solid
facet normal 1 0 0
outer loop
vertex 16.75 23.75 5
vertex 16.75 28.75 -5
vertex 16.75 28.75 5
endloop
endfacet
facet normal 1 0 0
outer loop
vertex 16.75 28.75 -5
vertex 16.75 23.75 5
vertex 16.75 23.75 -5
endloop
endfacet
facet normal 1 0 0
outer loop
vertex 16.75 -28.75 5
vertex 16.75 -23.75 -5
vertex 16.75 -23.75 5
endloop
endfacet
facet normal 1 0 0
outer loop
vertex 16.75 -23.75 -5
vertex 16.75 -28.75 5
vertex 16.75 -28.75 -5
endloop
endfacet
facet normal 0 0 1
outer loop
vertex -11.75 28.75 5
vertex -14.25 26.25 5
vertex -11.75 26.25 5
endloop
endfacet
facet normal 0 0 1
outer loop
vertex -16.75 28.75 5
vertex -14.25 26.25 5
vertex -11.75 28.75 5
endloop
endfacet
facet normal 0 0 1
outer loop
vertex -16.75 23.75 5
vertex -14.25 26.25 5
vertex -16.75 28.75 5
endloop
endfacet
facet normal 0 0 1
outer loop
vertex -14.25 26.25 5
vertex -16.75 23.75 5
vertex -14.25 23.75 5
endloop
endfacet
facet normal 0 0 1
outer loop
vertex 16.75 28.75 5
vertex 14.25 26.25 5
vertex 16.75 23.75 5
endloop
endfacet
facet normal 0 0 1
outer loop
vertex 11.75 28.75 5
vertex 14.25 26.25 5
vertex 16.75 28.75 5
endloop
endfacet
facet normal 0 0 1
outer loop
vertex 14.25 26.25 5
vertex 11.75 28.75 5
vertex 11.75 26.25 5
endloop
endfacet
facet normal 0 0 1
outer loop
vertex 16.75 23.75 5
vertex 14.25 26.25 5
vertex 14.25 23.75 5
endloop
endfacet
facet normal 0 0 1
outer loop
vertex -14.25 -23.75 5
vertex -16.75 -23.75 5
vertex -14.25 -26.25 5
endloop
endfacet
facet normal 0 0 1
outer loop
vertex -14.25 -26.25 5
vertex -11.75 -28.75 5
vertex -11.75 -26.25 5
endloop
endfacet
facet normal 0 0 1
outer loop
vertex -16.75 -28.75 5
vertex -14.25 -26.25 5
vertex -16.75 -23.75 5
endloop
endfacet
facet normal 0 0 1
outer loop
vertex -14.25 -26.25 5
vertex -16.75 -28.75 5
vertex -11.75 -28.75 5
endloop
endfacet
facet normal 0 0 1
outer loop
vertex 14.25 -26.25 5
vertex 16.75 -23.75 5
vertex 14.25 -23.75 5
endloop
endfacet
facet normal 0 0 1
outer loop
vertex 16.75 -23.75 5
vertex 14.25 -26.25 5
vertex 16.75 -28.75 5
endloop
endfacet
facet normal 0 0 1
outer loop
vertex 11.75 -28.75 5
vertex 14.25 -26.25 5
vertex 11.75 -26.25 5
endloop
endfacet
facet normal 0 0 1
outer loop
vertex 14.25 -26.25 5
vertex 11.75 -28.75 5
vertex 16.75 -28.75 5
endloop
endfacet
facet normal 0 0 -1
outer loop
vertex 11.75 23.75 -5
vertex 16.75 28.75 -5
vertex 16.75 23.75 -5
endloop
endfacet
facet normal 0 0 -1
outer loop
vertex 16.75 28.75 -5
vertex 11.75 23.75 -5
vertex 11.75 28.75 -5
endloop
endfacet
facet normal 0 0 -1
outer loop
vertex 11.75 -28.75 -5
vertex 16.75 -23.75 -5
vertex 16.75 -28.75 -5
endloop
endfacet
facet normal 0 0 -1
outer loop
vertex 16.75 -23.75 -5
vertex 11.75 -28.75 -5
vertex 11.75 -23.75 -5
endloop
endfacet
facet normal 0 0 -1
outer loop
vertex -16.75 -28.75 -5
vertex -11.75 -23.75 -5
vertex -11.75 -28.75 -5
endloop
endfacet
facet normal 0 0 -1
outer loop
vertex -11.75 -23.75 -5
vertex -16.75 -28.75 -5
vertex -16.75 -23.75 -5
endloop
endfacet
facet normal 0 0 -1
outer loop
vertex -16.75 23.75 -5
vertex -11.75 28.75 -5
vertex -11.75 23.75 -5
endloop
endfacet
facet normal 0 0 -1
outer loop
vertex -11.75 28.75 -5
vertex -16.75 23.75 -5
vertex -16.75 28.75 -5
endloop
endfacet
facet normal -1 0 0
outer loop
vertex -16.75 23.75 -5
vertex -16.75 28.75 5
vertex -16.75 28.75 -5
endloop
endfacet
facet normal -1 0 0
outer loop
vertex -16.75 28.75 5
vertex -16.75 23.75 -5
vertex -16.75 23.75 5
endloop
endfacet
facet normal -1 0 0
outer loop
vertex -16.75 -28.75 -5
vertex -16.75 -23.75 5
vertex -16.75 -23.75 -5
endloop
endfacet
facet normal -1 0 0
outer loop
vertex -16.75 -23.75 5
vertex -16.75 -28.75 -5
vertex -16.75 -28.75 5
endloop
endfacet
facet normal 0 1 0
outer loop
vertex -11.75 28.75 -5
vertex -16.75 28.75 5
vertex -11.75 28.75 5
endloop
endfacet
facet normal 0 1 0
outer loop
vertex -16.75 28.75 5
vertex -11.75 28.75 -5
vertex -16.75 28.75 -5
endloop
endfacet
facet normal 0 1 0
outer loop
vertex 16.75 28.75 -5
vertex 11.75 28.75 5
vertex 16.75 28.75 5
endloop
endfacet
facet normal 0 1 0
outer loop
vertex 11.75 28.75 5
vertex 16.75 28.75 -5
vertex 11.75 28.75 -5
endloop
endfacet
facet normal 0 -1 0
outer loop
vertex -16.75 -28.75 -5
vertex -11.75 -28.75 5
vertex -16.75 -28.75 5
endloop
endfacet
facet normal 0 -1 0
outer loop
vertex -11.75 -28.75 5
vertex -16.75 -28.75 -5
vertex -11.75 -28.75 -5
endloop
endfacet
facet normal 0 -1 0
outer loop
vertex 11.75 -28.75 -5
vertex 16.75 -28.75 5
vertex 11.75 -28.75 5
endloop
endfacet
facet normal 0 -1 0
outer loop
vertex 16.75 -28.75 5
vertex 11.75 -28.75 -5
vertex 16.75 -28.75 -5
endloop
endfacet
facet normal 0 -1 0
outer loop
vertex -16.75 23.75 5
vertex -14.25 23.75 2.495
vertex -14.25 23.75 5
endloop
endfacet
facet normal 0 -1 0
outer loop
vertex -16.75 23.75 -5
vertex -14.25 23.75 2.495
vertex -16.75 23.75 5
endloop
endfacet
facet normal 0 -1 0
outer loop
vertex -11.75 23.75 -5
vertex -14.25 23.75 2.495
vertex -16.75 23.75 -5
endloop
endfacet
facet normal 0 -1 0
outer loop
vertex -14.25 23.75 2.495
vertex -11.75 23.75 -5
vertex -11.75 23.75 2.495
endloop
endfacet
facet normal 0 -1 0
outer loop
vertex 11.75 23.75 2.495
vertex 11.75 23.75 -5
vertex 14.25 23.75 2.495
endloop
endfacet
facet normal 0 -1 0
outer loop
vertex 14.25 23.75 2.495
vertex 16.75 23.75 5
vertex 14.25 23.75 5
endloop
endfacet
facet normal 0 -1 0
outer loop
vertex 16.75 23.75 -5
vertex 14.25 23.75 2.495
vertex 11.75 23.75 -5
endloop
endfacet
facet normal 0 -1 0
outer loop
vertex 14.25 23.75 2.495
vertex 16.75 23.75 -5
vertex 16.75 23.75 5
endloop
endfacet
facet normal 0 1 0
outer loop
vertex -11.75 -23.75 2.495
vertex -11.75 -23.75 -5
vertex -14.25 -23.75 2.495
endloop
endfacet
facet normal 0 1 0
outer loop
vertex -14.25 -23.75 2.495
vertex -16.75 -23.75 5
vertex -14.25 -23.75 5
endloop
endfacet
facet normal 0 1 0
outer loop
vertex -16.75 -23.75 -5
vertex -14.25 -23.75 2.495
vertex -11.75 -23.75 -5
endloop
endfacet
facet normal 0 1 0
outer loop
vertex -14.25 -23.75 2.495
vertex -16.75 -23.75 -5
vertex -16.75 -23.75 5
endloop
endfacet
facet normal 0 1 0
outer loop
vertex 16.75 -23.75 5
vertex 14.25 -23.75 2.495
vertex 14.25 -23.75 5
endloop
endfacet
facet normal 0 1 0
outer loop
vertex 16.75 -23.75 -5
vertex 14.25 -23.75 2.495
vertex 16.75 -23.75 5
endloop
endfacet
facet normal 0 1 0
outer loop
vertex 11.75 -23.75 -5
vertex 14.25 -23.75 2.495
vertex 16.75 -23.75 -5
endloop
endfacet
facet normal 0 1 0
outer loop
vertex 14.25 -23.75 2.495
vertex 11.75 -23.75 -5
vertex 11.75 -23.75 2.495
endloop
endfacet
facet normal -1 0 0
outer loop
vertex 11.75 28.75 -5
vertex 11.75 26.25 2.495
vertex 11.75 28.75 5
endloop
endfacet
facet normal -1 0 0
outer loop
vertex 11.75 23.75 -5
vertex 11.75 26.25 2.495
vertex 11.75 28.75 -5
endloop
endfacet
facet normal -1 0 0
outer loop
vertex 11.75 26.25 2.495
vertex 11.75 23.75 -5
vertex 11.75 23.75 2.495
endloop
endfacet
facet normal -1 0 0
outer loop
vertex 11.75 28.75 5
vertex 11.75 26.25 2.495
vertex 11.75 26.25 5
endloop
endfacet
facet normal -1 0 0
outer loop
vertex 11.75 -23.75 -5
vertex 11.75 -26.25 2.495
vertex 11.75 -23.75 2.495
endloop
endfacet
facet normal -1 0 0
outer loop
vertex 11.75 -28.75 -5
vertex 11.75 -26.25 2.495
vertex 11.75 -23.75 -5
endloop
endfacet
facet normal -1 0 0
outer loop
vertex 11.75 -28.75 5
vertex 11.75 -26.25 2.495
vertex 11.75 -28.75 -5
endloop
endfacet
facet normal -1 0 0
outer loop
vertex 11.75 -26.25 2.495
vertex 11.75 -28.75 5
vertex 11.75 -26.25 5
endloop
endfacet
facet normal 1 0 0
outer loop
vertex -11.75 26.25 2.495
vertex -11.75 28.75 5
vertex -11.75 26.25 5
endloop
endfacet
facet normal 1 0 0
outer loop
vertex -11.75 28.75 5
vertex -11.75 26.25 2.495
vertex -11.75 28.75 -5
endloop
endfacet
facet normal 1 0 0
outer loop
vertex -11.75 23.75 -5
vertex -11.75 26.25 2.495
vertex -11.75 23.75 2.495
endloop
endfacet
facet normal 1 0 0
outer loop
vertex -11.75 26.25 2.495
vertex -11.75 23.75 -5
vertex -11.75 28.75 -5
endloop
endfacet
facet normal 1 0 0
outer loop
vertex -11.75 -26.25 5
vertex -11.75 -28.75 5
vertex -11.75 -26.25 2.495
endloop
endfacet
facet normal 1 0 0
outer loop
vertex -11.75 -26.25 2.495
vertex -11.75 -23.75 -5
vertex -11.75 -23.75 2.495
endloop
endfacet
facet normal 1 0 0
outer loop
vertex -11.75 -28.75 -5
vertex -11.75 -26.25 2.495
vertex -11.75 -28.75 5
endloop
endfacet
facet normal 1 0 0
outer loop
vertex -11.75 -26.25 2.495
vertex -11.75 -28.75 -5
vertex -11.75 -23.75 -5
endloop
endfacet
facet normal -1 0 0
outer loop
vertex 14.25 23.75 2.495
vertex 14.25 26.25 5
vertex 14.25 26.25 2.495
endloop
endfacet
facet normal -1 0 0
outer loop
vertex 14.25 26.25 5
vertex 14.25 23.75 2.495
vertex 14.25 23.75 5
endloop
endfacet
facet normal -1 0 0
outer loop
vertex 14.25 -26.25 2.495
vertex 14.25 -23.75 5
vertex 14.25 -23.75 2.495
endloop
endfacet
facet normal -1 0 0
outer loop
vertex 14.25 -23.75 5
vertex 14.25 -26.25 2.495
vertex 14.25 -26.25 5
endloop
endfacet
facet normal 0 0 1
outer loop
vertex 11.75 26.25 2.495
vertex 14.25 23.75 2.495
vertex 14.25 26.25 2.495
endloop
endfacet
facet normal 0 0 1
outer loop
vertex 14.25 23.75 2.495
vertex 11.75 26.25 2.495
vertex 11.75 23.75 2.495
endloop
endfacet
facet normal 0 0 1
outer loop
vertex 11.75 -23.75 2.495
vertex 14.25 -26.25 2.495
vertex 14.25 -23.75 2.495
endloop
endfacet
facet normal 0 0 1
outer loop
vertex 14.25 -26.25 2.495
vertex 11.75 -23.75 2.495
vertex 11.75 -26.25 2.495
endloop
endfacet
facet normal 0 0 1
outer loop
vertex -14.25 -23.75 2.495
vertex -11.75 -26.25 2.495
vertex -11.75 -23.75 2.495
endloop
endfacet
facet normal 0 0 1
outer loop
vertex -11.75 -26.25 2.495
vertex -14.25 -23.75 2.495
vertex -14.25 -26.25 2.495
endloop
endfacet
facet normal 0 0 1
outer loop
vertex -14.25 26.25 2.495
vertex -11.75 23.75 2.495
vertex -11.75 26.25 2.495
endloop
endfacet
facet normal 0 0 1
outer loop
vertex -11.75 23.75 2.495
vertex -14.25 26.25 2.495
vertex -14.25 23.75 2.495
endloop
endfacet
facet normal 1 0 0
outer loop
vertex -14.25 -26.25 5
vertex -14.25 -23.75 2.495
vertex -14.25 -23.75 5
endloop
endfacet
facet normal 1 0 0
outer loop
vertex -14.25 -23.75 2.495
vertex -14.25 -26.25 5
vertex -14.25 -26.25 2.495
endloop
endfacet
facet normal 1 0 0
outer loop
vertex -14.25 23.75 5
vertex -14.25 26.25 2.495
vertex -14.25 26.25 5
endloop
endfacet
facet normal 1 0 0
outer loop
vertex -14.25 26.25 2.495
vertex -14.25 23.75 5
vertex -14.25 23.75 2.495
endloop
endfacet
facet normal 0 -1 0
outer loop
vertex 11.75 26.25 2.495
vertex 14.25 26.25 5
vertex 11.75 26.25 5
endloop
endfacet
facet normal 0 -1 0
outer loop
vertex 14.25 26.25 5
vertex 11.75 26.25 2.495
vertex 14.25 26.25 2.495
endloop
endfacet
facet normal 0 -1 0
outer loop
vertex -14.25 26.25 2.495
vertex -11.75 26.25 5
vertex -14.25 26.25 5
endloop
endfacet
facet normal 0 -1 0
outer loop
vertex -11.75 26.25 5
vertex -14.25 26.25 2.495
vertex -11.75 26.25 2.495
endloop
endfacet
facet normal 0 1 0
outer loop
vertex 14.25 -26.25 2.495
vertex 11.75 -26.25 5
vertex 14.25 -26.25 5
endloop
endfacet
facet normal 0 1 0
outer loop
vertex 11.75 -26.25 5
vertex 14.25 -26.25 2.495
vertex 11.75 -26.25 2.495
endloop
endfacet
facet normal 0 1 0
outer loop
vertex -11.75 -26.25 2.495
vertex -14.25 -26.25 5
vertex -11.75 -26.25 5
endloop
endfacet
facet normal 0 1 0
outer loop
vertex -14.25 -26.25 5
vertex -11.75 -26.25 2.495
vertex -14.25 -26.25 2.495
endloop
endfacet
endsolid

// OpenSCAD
// file: ../sizes.scad
gap = 3; // distance between moving parts that should not touch
th = 2.5;

// rods -----------------------------------------------------------------------

rod25o = 25 + 0.0;
rod25i = rod25o - 1 * 2;

rod10o = 10 + 0.2;

// motors ---------------------------------------------------------------------

// 80XX

motor8D = 88.65 + 1.0;
motor8H = 21.5;
motor8Cut = 5;

// 60XX

motor6D = 57.7 + 1.0;
motor6H = 27.5;
motor6Cut = 8;


// motor6D = 68;
// motor6H = 23;
// motor6Cut = 4;

// board ----------------------------------------------------------------------

boardW = 28 + 0.5;
boardH = 52 + 0.5;

// battery --------------------------------------------------------------------

batteryZ = 140;
batteryX = 50;
batteryY = 50;
battery = [batteryX, batteryY, batteryZ];

// arm ------------------------------------------------------------------------

armMotorOffset = [70, 30 , 0];
armLength = 160;

// shoulder -------------------------------------------------------------------

shoulderWidth = 140;
shoulderY = 30;
shoulderX = shoulderWidth/2;
shoulderZ = 300;
shoulderOffset = [shoulderX, shoulderY, shoulderZ];

// body -----------------------------------------------------------------------

headD = 200;
headOffsetZ = 400;
headOffsetY = 60;
headOffset = [0, headOffsetY, headOffsetZ];

bodyMotorOffsetX = motor6D/2 + gap * 2;
bodyMotorOffsetZ = -motor6D/2;
bodyMotorOffsetY = -30;
bodyMotorOffset = [bodyMotorOffsetX, bodyMotorOffsetY, bodyMotorOffsetZ];

// heap -----------------------------------------------------------------------

heapMotorOffsetX = 30;
heapMotorOffsetZ = -10;
heapMotorOffsetY = motor6H + motor8D/2 + 10;
heapMotorOffset = [heapMotorOffsetX, heapMotorOffsetY, heapMotorOffsetZ];

// thigh ----------------------------------------------------------------------

thighMotorOffsetX = 0;
thighMotorOffsetY = 0;
thighLength = 200;
thighMotorOffset = [thighMotorOffsetX, thighMotorOffsetY, -thighLength];

// shin -----------------------------------------------------------------------

shinMotorOffsetX = -15;
shinMotorOffsetY = 0;
shinLength = 200;
shinMotorOffset = [shinMotorOffsetX, shinMotorOffsetY, -shinLength];

// foot -----------------------------------------------------------------------
// main file
include <../sizes.scad>

boardHolder();

module boardHolder() {
	h = 10;
	
	difference(){
		cube([boardW + th*2, boardH+th*2, h], center = true);
		cube([boardW + th*2 + 0.01, boardH - th*2, h + 0.01], center = true);
		cube([boardW - th*2, boardH + th*2 + 0.01, h + 0.01], center = true);
		
		translate([0, 0, h - th]) {
			cube([boardW, boardH, h + 0.01], center = true);
		}
	}
}
